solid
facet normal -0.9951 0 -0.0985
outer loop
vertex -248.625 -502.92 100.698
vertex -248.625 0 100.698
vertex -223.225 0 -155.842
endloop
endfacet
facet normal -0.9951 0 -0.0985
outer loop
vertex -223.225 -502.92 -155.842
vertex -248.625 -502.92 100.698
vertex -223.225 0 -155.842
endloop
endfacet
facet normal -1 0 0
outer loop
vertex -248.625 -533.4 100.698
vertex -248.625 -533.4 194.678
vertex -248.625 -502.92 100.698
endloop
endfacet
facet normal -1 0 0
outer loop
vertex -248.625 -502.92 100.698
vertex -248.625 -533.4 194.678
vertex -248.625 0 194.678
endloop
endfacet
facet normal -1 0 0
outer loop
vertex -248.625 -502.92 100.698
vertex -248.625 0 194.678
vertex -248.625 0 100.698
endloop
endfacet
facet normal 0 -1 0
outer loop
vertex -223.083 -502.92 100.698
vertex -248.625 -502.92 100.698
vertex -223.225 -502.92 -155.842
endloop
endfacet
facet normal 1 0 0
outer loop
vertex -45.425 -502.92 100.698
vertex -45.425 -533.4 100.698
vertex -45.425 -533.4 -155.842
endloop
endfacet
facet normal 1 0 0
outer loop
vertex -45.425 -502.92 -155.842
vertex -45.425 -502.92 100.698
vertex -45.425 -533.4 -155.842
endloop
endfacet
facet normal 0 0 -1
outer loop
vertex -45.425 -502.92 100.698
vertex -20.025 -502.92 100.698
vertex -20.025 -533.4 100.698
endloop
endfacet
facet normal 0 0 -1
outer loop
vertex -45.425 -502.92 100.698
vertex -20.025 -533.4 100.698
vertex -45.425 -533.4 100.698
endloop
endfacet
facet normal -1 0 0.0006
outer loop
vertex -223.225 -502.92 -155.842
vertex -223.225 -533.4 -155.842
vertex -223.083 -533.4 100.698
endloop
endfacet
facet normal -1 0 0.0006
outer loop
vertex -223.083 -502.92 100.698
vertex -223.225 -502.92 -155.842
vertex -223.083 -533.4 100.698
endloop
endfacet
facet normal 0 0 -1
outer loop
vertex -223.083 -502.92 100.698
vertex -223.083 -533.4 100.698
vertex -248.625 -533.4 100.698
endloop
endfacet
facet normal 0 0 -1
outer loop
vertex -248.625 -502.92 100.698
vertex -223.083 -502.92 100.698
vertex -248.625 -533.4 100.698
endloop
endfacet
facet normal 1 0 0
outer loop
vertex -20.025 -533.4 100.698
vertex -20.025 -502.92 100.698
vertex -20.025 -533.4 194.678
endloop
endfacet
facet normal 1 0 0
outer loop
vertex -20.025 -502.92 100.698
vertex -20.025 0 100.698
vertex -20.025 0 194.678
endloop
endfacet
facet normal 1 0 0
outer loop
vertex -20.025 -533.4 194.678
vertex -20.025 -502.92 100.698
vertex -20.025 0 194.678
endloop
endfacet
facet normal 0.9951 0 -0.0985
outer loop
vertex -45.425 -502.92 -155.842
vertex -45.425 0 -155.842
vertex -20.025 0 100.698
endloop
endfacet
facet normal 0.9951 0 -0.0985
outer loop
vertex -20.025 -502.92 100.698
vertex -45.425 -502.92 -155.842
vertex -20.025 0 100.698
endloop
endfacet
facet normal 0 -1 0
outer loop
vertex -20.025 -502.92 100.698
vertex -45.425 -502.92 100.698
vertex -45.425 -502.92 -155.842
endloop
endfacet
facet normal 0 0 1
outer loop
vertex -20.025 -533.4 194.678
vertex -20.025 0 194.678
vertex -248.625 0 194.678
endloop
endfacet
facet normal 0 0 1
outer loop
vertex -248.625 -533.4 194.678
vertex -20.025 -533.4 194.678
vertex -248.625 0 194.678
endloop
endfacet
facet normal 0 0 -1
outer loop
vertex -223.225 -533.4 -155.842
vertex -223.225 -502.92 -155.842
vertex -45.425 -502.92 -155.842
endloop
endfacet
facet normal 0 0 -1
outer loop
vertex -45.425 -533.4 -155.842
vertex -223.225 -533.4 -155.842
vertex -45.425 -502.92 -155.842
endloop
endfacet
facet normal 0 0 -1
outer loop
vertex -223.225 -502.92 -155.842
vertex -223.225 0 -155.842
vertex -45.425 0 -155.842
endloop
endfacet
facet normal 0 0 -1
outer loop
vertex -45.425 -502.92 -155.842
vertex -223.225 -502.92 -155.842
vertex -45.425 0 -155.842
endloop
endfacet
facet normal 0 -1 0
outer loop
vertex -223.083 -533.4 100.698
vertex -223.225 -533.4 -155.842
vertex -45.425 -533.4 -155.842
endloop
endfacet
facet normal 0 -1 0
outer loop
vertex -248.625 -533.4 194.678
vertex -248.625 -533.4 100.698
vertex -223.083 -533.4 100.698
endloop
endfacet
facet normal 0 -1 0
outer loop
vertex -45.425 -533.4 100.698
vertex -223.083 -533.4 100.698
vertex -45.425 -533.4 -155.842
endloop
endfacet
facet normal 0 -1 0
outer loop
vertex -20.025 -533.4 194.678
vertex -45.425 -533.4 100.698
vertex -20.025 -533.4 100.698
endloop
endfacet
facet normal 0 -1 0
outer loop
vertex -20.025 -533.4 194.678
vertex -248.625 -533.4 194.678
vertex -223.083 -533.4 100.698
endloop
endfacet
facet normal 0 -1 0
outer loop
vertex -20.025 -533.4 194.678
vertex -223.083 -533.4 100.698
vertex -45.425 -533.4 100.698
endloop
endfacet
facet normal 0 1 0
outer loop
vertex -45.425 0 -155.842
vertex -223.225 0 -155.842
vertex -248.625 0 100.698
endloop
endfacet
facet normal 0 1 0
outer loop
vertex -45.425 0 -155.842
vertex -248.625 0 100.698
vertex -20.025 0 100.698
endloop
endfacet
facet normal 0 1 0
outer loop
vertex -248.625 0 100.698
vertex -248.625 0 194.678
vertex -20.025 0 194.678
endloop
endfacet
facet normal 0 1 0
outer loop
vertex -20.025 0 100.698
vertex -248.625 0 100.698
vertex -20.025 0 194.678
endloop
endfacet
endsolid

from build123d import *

# Parameters (mm, degrees)
F1_DEPTH = 533.4
F3_DEPTH = 30.48
F5_DEPTH = 25.4


with BuildPart() as f1:
    # F0 (on Front) → F1 (new body)
    with BuildSketch(Plane.XZ):
        Polygon((-20.0246775488, 194.6782106813), (-248.6246775488, 194.6782106813), (-248.6246775488, 100.6982106813), (-223.2246775488, 100.6982106813), (-224.7843856167, -140.0887378329), (-223.2246775488, -155.8417893187), (-45.4246775488, -155.8417893187), (-43.8649694809, -140.0887378329), (-45.4246775488, 100.6982106813), (-20.0246775488, 100.6982106813), align=None)
        Polygon((-223.2246775488, 100.6982106813), (-248.6246775488, 100.6982106813), (-224.7843856167, -140.0887378329), align=None)
        Polygon((-43.8649694809, -140.0887378329), (-20.0246775488, 100.6982106813), (-45.4246775488, 100.6982106813), align=None)
    extrude(amount=F1_DEPTH)

    # F2 (on face) → F3 (cut)
    with BuildSketch(Plane.XZ.offset(533.4)):
        Polygon((-223.0825424194, 100.6982106813), (-248.6246775488, 100.6982106813), (-223.2246775488, -155.8417893187), align=None)
        Polygon((-45.4246775488, 100.6982106813), (-45.4246775488, -155.8417893187), (-20.0246775488, 100.6982106813), align=None)
    extrude(amount=-F3_DEPTH, mode=Mode.SUBTRACT)

    # F4 (on face) → F5 (cut)
    with BuildSketch(Plane.XZ):
        Polygon((-43.5820221101, -153.1578327248), (-18.1820221101, 100.8364513063), (-20.0246775488, 100.8364513063), (-20.0246775488, 100.6982106813), (-45.2851133126, 100.6982106813), align=None)
        Polygon((-223.2246775488, 100.6982106813), (-246.6658660559, 100.6982106813), (-224.6561073752, -120.2852073061), align=None)
        Polygon((-222.1963950907, 100.6689677848), (-246.7820221101, 101.8644461788), (-246.6658660559, 100.6982106813), (-223.2246775488, 100.6982106813), (-224.6561073752, -120.2852073061), (-221.3820221101, -153.1578327248), align=None)
    extrude(amount=-F5_DEPTH, mode=Mode.SUBTRACT)


solid = f1.part
